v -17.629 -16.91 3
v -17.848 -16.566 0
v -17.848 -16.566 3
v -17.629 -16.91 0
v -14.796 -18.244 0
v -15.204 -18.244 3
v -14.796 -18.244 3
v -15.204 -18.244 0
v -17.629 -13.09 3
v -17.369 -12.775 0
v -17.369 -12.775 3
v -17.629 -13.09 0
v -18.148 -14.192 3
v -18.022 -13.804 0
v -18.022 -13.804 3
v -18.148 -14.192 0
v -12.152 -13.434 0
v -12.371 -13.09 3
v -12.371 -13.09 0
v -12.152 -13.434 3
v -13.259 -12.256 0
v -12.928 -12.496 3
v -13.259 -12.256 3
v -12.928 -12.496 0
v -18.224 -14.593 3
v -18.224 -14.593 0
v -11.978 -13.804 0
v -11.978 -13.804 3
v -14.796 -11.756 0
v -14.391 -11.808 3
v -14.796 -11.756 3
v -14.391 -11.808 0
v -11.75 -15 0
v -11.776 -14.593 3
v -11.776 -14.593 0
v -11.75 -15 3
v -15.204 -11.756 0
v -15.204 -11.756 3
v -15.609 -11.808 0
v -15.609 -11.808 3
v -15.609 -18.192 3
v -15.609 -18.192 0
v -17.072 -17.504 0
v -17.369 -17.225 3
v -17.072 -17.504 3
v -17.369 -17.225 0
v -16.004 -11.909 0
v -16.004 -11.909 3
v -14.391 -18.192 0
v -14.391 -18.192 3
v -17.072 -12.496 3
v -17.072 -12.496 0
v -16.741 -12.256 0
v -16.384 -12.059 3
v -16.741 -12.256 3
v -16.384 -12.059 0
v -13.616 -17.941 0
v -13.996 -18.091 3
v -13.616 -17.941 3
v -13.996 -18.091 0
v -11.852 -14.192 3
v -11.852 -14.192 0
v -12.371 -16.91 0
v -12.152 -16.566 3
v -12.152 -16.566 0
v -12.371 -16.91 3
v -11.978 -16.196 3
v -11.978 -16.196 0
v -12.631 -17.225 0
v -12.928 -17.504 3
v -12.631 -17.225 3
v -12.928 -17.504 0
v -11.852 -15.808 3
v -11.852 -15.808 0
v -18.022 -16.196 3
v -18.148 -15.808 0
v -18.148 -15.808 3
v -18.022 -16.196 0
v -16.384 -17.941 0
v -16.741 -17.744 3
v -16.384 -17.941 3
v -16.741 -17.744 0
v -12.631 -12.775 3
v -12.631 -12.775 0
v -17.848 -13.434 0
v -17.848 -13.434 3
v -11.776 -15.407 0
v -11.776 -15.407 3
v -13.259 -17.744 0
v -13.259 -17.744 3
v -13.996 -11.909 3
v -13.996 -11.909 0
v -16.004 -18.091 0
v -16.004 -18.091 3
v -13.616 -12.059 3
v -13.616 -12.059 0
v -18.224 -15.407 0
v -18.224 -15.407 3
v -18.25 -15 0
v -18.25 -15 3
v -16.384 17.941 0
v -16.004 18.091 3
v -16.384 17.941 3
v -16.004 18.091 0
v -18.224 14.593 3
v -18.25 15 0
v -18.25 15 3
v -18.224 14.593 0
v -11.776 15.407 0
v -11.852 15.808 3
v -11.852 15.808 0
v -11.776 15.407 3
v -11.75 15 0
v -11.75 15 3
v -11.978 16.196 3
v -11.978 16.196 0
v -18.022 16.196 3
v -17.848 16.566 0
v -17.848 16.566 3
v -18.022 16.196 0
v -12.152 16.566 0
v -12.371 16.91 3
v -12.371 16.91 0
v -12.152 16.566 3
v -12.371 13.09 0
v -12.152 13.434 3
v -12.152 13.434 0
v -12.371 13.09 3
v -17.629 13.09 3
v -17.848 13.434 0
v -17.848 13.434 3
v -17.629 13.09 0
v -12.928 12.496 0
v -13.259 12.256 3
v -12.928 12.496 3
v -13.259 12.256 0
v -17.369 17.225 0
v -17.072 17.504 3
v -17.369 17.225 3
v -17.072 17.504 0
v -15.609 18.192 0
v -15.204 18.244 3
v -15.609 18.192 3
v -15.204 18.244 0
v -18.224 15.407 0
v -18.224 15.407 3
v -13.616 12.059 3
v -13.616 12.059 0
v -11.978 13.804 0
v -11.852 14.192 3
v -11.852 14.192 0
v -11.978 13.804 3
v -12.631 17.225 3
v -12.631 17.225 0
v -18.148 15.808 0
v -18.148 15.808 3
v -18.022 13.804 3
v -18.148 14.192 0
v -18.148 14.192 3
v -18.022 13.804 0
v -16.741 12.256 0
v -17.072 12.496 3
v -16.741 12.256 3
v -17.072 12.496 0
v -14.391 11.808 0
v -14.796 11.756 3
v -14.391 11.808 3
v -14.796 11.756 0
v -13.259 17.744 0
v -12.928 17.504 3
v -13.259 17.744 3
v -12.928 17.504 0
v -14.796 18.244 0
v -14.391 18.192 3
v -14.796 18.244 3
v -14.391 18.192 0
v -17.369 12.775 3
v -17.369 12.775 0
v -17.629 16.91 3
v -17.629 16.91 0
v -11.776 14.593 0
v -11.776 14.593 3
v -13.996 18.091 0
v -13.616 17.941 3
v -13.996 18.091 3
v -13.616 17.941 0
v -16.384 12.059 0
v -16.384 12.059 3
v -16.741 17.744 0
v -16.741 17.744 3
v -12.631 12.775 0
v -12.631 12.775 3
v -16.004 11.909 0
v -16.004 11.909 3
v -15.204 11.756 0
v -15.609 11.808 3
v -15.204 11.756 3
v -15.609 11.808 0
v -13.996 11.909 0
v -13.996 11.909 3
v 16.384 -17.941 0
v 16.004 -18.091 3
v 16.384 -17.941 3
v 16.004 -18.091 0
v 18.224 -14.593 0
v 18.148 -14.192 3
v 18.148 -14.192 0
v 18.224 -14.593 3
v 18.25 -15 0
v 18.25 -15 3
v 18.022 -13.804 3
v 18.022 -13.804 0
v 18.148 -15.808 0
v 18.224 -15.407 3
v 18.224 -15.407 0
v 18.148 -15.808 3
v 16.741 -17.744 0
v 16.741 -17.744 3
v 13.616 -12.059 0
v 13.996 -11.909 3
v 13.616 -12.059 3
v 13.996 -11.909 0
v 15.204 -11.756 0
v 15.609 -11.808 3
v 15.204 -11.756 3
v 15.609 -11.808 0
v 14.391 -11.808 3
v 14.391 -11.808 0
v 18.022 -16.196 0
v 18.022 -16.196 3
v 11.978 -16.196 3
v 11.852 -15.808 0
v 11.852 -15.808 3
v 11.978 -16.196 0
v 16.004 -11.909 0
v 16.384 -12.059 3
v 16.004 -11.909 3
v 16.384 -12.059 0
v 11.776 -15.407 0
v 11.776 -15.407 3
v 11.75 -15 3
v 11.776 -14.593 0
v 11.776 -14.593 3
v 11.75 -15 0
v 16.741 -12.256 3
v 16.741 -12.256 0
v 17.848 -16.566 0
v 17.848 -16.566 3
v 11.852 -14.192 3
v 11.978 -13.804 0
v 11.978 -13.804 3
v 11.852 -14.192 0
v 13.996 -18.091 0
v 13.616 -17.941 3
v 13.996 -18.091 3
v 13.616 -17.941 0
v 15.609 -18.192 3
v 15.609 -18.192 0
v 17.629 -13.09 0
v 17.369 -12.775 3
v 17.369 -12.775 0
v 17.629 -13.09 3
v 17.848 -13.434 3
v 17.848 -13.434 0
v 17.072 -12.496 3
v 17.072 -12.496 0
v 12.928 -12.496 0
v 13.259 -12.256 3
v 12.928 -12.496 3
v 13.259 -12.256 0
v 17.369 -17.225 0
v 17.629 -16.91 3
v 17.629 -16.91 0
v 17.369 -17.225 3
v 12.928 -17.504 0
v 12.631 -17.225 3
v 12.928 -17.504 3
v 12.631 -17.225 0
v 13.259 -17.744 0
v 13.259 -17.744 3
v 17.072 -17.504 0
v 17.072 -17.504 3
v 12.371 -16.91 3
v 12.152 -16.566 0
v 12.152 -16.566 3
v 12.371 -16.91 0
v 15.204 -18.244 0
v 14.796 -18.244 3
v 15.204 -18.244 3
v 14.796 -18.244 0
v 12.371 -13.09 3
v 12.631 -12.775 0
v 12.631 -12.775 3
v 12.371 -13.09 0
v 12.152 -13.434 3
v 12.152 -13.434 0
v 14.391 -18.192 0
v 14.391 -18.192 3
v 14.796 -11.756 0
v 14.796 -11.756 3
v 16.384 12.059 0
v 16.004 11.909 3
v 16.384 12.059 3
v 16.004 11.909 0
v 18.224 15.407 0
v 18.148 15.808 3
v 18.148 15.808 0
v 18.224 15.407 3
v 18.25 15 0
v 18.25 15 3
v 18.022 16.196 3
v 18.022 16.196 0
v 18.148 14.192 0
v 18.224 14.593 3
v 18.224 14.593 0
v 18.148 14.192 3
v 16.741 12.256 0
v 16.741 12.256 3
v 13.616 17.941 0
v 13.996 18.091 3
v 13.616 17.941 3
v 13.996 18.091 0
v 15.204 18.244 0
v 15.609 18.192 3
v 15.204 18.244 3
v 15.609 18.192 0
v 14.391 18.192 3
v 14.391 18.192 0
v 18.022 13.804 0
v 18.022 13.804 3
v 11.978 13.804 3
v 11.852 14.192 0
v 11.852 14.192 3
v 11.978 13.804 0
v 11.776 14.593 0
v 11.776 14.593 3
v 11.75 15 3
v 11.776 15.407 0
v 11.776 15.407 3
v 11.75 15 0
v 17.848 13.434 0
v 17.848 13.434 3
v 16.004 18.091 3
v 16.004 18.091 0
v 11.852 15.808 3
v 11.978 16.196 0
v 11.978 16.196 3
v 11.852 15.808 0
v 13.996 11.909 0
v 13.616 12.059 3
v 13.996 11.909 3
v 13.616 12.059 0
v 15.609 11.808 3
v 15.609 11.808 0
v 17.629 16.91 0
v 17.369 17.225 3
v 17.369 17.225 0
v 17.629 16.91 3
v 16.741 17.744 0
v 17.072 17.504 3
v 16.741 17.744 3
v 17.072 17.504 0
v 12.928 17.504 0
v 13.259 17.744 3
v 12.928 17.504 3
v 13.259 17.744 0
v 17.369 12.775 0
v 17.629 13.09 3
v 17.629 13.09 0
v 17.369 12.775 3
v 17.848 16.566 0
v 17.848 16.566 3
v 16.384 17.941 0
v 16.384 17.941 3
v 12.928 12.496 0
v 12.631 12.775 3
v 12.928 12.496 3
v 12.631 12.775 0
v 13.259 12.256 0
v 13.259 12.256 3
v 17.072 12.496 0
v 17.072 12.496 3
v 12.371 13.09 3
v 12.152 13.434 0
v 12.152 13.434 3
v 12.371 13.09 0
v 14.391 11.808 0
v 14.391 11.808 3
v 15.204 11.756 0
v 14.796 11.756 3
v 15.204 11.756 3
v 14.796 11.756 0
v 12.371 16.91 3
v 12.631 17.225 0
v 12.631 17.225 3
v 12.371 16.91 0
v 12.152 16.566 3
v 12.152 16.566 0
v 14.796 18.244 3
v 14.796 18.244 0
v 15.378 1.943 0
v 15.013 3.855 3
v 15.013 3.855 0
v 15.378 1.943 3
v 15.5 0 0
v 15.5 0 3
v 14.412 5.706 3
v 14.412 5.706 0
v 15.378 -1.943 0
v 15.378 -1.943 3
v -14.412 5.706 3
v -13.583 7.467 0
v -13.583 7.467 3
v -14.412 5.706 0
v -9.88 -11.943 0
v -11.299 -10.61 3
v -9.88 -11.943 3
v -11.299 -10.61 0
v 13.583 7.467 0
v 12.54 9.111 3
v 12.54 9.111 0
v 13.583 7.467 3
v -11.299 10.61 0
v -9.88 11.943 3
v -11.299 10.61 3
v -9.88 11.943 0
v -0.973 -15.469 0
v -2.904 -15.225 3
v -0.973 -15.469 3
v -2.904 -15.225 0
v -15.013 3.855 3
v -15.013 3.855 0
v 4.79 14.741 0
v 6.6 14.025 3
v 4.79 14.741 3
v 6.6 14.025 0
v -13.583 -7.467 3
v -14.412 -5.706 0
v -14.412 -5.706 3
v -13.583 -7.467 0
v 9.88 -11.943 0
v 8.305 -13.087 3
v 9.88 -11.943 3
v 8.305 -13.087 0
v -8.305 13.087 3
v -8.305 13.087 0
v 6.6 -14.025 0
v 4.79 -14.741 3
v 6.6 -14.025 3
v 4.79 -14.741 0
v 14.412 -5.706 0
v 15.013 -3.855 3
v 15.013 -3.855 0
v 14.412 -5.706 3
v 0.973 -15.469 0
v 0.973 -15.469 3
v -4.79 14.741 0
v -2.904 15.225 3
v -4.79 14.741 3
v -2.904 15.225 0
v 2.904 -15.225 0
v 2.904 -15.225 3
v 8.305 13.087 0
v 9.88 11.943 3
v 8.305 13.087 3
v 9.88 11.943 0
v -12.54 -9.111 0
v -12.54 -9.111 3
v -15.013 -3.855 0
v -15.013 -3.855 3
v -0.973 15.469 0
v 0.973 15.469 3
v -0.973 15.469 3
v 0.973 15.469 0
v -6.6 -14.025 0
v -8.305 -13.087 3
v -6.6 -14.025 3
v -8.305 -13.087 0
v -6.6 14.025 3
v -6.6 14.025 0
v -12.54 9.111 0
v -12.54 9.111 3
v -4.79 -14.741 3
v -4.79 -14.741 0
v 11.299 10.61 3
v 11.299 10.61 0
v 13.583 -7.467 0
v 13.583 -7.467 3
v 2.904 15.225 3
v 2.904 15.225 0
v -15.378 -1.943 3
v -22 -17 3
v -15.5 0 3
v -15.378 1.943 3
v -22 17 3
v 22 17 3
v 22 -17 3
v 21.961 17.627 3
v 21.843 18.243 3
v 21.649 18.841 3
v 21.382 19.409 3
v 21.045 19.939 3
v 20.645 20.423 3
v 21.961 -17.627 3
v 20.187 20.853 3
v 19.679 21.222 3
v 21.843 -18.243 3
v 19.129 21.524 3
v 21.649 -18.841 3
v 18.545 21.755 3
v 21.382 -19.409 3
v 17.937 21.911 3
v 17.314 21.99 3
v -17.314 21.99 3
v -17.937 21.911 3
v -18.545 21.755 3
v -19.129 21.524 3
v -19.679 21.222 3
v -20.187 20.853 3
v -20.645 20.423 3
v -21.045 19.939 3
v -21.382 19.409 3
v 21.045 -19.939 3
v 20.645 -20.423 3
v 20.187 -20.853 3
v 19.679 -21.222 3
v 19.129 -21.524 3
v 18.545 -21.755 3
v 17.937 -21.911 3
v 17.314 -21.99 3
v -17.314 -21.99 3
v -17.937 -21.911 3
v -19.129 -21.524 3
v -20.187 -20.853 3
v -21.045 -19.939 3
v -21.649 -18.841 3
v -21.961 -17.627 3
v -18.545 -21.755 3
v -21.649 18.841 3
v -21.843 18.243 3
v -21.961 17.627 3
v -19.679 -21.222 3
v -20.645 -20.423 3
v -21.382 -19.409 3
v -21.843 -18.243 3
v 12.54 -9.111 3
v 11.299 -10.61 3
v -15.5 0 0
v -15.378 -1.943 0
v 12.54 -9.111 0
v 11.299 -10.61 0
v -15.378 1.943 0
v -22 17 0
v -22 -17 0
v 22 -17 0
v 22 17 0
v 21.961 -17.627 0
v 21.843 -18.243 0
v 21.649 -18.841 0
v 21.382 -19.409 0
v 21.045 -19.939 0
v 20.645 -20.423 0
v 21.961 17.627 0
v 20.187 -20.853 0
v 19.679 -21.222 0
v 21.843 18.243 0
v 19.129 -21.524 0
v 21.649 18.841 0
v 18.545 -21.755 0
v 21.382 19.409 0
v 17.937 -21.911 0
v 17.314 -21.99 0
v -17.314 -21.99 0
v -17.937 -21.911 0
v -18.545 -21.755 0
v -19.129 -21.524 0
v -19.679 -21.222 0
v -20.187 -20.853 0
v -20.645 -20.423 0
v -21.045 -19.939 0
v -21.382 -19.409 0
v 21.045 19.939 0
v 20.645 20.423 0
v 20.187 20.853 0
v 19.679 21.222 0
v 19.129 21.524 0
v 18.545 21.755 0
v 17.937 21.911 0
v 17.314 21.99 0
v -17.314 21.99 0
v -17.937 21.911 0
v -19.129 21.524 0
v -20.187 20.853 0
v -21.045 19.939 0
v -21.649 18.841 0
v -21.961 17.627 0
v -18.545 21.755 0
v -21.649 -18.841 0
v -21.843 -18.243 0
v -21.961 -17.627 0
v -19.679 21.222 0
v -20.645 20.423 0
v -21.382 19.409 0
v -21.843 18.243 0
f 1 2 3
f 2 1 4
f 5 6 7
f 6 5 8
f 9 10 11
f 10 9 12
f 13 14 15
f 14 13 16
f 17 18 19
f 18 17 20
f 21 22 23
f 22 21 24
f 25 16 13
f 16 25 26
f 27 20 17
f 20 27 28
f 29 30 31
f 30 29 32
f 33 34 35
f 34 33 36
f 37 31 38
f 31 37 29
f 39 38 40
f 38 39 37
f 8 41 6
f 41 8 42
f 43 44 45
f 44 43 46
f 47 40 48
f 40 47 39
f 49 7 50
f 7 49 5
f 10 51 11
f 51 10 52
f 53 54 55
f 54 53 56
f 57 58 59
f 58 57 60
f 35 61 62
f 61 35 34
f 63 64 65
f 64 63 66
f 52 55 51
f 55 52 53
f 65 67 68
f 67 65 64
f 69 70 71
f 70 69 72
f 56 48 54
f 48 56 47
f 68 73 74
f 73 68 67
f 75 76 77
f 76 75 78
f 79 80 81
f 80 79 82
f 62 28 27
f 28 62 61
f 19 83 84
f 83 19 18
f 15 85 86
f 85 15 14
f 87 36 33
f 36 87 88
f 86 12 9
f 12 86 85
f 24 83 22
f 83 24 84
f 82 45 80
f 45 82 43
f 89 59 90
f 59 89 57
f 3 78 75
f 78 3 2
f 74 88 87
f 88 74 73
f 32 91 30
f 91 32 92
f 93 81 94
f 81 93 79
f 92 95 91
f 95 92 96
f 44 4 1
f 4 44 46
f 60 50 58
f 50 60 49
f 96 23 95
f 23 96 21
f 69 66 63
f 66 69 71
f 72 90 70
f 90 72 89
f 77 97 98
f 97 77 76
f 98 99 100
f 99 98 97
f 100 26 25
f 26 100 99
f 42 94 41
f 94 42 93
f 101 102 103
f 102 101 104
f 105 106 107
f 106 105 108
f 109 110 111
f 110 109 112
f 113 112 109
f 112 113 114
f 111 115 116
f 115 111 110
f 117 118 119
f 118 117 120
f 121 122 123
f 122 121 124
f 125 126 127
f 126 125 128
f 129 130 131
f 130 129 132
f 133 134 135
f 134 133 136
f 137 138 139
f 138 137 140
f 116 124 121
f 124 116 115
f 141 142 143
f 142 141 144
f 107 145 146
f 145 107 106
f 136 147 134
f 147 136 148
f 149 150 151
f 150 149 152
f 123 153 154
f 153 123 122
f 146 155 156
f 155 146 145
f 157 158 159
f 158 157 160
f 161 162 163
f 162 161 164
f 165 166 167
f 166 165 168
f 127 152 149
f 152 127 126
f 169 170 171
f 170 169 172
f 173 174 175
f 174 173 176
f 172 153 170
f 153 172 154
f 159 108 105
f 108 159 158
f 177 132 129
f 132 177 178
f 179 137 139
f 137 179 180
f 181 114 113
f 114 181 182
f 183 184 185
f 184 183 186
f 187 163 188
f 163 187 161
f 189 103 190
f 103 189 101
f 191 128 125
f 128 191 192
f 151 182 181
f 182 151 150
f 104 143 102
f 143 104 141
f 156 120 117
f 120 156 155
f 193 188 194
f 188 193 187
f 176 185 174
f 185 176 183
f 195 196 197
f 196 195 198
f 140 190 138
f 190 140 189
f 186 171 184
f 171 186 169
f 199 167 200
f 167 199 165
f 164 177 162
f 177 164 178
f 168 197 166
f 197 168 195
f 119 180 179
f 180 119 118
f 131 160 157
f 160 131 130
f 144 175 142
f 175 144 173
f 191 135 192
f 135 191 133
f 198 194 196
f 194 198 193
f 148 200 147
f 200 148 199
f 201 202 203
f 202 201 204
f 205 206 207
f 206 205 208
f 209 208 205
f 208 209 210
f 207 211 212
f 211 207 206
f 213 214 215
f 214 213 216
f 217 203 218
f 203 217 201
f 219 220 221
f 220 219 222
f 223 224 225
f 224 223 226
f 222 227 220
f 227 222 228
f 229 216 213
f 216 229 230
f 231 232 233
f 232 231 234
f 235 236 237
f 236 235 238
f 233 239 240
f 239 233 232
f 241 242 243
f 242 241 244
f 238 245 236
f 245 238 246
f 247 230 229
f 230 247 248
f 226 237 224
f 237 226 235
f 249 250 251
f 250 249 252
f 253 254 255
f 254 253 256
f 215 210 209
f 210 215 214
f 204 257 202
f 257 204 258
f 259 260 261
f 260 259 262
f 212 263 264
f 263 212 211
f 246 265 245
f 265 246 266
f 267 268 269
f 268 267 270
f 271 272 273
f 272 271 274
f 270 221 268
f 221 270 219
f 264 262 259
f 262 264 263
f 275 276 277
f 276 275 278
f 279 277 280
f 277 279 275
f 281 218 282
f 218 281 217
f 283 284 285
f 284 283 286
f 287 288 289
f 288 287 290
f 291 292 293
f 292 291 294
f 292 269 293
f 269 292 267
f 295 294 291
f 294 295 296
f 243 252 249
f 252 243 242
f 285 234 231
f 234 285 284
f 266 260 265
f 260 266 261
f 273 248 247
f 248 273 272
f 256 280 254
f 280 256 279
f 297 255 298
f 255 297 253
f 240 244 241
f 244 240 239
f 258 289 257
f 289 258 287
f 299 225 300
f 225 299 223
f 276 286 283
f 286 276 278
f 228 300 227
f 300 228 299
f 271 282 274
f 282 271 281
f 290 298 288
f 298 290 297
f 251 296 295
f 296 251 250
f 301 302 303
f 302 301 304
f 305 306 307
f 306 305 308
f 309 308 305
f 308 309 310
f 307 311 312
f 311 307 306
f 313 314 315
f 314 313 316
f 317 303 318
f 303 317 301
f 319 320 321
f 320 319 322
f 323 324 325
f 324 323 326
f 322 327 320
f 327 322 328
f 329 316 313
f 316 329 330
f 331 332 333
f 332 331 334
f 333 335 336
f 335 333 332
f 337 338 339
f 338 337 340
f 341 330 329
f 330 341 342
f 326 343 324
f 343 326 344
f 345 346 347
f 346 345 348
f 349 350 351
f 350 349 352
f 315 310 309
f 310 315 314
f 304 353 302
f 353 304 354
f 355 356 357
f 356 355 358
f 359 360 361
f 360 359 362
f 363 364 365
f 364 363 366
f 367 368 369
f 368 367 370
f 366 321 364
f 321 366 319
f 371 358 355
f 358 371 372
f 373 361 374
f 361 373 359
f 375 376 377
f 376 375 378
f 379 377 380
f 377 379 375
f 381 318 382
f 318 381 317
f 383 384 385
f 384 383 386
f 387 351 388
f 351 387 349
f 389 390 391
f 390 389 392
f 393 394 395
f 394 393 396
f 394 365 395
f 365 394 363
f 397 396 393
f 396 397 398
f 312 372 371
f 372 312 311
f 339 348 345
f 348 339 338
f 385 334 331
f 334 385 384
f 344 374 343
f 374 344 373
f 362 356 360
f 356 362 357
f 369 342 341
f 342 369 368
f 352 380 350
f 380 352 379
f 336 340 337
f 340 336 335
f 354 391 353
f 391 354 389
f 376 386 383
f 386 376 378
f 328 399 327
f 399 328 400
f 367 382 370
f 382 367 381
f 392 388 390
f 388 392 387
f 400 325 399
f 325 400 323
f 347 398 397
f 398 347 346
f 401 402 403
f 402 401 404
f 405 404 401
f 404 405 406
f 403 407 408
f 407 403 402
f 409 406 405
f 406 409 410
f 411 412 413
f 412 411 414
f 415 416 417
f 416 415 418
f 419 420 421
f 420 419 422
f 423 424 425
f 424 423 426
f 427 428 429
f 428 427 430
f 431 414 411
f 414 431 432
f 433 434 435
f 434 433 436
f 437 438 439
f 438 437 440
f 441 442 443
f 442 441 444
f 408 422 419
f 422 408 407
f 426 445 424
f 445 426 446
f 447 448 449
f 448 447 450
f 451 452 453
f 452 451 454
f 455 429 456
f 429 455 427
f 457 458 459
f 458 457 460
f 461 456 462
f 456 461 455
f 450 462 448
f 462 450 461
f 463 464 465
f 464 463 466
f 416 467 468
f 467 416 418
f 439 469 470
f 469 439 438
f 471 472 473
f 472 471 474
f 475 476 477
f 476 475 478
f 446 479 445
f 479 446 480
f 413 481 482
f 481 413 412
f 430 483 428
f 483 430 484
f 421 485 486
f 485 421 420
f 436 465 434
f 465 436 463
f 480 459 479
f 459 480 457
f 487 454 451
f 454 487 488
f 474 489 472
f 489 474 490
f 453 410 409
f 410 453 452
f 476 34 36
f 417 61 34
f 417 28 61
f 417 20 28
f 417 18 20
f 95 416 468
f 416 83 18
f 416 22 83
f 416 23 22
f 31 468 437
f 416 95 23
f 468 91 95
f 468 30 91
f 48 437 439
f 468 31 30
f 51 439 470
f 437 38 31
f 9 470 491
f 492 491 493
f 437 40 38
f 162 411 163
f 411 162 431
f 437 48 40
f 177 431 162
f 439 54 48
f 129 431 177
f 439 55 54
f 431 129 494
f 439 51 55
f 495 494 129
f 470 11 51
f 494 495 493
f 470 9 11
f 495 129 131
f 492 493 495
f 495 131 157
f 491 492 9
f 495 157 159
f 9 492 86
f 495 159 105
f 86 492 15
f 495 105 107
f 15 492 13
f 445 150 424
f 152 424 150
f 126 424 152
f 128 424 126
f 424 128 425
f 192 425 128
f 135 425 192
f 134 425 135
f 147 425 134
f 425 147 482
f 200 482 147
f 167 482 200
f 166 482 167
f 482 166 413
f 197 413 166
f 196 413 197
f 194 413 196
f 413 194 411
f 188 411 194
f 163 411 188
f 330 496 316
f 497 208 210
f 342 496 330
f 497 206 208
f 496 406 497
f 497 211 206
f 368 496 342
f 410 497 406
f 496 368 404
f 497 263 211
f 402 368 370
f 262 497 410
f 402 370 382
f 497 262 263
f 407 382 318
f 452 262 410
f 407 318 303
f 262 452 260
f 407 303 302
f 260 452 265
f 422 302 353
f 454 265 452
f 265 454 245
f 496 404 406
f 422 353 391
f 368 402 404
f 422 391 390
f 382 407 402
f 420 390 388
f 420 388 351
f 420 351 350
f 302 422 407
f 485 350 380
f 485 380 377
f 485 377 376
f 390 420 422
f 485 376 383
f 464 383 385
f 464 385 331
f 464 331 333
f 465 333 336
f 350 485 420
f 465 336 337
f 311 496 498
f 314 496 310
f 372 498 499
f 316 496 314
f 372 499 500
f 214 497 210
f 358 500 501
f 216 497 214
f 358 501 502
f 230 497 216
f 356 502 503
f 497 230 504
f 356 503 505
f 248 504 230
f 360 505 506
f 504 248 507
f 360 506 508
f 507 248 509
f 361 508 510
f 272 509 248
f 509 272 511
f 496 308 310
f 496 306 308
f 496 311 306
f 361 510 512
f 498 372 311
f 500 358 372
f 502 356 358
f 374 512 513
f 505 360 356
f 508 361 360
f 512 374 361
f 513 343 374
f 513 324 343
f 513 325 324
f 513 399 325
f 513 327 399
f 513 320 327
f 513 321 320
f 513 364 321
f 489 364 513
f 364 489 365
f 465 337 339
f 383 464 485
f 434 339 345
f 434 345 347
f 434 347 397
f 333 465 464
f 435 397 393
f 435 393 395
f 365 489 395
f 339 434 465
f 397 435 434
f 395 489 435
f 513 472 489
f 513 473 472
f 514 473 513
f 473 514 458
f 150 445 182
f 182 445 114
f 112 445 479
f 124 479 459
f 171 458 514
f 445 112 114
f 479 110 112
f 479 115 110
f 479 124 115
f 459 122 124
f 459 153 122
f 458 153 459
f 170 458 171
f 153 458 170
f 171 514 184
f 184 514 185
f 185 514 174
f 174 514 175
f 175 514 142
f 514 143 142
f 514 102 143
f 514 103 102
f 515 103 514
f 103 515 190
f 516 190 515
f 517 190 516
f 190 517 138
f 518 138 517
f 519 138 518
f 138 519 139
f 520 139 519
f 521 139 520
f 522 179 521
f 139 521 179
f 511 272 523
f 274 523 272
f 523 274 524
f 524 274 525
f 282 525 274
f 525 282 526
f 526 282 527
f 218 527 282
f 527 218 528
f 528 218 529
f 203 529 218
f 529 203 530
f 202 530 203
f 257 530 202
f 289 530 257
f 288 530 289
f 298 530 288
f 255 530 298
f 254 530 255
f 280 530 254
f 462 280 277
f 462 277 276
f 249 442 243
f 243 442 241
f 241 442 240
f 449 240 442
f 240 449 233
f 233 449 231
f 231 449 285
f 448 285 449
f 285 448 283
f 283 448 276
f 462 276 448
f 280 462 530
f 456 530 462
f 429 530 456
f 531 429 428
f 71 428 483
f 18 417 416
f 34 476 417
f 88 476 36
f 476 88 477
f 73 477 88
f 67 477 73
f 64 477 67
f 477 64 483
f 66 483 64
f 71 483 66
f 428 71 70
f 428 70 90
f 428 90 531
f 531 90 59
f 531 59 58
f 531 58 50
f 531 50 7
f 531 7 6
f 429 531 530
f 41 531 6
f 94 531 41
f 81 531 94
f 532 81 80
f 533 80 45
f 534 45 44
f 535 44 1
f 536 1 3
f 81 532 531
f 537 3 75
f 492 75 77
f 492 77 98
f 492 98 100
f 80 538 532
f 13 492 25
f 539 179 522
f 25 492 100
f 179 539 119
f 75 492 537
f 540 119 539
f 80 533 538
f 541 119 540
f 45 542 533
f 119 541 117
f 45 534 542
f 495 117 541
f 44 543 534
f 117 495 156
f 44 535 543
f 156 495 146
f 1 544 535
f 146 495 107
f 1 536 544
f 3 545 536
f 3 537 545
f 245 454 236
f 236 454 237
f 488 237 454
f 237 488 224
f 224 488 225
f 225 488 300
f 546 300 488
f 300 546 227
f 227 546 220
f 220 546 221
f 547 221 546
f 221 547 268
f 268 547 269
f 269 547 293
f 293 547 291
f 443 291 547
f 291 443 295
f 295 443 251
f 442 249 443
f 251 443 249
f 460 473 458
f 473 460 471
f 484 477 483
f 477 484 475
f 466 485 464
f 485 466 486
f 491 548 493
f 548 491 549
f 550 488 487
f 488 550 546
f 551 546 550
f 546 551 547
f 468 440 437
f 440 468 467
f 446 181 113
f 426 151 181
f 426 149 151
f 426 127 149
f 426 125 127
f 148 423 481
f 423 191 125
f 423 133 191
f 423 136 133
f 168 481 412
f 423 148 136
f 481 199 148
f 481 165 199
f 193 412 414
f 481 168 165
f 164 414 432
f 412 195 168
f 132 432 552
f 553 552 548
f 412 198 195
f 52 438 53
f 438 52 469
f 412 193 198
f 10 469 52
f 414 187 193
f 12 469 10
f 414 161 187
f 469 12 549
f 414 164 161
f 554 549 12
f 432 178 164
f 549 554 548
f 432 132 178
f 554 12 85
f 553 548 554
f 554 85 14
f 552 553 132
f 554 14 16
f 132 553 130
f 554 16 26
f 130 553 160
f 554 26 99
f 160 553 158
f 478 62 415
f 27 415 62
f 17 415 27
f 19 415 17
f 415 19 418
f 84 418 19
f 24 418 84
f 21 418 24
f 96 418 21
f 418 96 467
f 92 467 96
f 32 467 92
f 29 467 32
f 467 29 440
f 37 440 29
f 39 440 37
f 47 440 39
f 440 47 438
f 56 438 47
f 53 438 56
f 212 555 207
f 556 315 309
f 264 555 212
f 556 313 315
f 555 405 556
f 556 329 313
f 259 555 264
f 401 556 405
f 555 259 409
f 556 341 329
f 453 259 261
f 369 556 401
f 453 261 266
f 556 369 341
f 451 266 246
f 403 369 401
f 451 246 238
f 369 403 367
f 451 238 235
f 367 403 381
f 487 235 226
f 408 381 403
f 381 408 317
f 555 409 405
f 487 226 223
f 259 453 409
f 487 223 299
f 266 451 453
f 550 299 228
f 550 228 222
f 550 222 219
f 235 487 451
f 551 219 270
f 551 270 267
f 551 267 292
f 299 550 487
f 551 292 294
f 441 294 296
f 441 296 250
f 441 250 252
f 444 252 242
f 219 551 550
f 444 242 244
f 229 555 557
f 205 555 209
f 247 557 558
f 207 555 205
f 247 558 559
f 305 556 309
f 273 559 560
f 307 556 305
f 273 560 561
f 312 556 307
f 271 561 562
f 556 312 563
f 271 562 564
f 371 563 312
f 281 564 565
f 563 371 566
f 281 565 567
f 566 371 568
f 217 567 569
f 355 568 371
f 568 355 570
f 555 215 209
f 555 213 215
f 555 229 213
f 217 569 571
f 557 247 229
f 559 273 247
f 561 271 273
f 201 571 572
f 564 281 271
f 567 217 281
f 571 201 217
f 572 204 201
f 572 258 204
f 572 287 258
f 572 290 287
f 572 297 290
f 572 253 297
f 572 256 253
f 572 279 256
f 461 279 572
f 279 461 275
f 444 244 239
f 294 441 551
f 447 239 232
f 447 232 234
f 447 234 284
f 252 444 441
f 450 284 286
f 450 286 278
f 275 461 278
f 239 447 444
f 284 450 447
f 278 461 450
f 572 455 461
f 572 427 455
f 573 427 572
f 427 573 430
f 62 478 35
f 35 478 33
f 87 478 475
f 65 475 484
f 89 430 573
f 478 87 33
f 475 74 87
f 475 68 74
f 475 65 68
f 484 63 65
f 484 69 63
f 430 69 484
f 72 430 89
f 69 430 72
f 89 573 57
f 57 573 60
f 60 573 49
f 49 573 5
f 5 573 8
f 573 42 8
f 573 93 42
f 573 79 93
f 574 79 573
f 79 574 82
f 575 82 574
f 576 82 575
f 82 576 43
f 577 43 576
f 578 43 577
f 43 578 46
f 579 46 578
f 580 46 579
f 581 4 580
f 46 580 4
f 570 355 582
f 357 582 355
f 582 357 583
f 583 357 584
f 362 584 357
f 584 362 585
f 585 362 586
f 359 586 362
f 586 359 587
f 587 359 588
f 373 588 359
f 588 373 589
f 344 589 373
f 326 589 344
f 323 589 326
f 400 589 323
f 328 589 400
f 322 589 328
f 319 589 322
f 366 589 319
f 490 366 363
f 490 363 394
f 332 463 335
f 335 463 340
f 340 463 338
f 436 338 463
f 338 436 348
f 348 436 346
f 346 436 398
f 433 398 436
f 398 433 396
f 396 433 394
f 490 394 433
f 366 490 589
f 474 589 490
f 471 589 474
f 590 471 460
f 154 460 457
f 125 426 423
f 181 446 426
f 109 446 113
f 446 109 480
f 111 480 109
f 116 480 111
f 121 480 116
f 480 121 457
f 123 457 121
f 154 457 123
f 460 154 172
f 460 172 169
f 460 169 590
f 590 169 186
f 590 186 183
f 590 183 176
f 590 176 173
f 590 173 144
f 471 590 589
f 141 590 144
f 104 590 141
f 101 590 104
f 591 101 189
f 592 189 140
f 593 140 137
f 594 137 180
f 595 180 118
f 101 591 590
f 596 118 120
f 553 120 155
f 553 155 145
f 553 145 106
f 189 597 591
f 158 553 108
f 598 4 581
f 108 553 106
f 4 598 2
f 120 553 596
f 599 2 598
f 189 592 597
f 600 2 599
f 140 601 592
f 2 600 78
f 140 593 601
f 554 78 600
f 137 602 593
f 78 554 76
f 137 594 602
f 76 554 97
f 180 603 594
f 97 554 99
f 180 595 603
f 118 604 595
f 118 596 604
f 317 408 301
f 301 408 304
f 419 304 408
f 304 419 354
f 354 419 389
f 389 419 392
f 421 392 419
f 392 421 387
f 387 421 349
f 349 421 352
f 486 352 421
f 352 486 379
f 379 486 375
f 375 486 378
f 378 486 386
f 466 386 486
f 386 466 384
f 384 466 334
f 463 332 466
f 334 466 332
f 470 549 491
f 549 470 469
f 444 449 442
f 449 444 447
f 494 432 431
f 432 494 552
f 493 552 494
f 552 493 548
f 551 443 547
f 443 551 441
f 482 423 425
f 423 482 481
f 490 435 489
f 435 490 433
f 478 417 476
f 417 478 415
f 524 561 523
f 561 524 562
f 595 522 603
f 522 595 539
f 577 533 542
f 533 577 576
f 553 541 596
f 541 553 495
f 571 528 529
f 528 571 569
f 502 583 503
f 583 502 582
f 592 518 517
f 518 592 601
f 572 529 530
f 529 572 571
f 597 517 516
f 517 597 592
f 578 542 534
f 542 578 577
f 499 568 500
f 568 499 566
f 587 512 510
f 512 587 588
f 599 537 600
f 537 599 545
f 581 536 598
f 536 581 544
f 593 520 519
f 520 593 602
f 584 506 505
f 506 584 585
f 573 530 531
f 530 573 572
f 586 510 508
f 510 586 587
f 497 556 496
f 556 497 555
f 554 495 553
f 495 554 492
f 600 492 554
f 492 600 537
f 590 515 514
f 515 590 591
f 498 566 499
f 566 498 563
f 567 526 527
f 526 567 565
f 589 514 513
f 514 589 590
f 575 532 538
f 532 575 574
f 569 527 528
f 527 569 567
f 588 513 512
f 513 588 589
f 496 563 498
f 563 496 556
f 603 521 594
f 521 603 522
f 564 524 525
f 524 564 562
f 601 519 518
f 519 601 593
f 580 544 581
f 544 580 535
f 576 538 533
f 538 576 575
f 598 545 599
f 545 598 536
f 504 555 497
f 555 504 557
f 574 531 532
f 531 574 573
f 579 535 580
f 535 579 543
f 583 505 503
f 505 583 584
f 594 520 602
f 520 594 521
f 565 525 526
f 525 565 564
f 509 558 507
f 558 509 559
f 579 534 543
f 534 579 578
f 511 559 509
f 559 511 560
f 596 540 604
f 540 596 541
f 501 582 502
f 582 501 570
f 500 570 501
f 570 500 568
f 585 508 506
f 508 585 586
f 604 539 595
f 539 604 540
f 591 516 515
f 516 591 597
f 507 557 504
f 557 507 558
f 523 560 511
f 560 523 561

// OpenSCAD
$fn = 50;


difference() {
	union() {
		hull() {
			translate(v = [-17.0000000000, 17.0000000000, 0]) {
				cylinder(h = 3, r = 5);
			}
			translate(v = [17.0000000000, 17.0000000000, 0]) {
				cylinder(h = 3, r = 5);
			}
			translate(v = [-17.0000000000, -17.0000000000, 0]) {
				cylinder(h = 3, r = 5);
			}
			translate(v = [17.0000000000, -17.0000000000, 0]) {
				cylinder(h = 3, r = 5);
			}
		}
	}
	union() {
		#translate(v = [-15.0000000000, -15.0000000000, -100.0000000000]) {
			cylinder(h = 200, r = 3.2500000000);
		}
		#translate(v = [-15.0000000000, 15.0000000000, -100.0000000000]) {
			cylinder(h = 200, r = 3.2500000000);
		}
		#translate(v = [15.0000000000, -15.0000000000, -100.0000000000]) {
			cylinder(h = 200, r = 3.2500000000);
		}
		#translate(v = [15.0000000000, 15.0000000000, -100.0000000000]) {
			cylinder(h = 200, r = 3.2500000000);
		}
		#cylinder(h = 3, r = 15.5000000000);
	}
}
